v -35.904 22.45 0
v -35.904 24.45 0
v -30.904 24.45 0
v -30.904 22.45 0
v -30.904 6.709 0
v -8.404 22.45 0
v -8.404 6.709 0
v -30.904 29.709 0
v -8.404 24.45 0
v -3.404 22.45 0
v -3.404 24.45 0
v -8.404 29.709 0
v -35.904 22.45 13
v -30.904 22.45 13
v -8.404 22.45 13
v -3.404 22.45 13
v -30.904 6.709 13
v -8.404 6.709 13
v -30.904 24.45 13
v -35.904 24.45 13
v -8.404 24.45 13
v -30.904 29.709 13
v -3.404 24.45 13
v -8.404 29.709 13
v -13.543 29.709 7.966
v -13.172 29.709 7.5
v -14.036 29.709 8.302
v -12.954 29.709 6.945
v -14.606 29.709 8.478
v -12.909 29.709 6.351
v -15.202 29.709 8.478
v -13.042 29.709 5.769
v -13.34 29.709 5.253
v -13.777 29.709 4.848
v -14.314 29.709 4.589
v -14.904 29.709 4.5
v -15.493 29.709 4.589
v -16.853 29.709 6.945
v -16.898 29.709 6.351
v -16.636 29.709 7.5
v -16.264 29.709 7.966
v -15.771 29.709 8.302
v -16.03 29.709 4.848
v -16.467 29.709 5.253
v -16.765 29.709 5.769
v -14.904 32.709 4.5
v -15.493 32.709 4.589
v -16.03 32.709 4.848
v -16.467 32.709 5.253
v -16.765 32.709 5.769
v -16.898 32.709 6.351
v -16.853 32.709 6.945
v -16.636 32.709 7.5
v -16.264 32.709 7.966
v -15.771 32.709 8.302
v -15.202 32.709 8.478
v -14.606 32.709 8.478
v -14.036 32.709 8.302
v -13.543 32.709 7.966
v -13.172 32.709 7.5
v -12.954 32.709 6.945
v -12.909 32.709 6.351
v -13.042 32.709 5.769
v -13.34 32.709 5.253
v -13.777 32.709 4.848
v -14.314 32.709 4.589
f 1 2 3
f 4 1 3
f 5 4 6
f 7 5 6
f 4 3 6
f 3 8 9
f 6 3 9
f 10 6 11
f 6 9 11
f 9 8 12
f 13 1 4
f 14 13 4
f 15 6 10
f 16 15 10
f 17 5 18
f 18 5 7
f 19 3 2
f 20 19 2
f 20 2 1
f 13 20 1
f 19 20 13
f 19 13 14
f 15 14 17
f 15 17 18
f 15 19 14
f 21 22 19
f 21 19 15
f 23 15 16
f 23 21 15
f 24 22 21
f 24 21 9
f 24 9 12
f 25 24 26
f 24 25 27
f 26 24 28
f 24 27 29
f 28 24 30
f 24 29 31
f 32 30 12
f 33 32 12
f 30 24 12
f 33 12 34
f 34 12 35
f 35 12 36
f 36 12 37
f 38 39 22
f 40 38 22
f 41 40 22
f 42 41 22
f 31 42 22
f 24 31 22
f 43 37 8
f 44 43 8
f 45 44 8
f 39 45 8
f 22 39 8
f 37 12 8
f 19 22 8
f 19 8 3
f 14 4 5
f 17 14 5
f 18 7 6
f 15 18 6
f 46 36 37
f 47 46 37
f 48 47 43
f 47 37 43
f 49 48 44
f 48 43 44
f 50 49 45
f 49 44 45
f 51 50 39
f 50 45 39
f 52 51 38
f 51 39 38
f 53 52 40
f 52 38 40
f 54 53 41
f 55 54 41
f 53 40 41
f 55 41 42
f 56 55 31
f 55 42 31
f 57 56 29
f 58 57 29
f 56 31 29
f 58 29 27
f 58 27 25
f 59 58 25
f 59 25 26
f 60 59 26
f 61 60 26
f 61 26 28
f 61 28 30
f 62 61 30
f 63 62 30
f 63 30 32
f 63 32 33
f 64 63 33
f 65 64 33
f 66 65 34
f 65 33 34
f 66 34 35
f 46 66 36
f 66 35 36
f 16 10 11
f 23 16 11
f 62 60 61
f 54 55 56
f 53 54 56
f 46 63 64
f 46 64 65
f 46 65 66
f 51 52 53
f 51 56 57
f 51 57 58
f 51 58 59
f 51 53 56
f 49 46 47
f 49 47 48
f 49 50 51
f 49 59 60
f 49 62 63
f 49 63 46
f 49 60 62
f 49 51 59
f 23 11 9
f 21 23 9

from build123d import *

# Parameters (mm, degrees)
EXTRUSION1_DEPTH = 13
ESQUISSE2_R      = 2
EXTRUSION2_DEPTH = 3


with BuildPart() as part:
    # Esquisse1 → Extrusion1 (new body)
    with BuildSketch(Plane.XY):
        Polygon((-30.903636364, 29.709316239), (-30.903636364, 24.450320542), (-35.903636364, 24.450320542), (-35.903636364, 22.450320542), (-30.903636364, 22.450320542), (-30.903636364, 6.709316239), (-8.403636364, 6.709316239), (-8.403636364, 22.450320542), (-3.403636364, 22.450320542), (-3.403636364, 24.450320542), (-8.403636364, 24.450320542), (-8.403636364, 29.709316239), align=None)
    extrude(amount=EXTRUSION1_DEPTH)

    # Esquisse2 → Extrusion2 (add)
    with BuildSketch(Plane(origin=(0, 29.709316239, 0), x_dir=(1, 0, 0), z_dir=(0, 1, 0))):
        with Locations(Location((-14.903636364, -6.5, 0), (0, 0, 90))):
            Circle(ESQUISSE2_R)
    extrude(amount=EXTRUSION2_DEPTH)


solid = part.part
